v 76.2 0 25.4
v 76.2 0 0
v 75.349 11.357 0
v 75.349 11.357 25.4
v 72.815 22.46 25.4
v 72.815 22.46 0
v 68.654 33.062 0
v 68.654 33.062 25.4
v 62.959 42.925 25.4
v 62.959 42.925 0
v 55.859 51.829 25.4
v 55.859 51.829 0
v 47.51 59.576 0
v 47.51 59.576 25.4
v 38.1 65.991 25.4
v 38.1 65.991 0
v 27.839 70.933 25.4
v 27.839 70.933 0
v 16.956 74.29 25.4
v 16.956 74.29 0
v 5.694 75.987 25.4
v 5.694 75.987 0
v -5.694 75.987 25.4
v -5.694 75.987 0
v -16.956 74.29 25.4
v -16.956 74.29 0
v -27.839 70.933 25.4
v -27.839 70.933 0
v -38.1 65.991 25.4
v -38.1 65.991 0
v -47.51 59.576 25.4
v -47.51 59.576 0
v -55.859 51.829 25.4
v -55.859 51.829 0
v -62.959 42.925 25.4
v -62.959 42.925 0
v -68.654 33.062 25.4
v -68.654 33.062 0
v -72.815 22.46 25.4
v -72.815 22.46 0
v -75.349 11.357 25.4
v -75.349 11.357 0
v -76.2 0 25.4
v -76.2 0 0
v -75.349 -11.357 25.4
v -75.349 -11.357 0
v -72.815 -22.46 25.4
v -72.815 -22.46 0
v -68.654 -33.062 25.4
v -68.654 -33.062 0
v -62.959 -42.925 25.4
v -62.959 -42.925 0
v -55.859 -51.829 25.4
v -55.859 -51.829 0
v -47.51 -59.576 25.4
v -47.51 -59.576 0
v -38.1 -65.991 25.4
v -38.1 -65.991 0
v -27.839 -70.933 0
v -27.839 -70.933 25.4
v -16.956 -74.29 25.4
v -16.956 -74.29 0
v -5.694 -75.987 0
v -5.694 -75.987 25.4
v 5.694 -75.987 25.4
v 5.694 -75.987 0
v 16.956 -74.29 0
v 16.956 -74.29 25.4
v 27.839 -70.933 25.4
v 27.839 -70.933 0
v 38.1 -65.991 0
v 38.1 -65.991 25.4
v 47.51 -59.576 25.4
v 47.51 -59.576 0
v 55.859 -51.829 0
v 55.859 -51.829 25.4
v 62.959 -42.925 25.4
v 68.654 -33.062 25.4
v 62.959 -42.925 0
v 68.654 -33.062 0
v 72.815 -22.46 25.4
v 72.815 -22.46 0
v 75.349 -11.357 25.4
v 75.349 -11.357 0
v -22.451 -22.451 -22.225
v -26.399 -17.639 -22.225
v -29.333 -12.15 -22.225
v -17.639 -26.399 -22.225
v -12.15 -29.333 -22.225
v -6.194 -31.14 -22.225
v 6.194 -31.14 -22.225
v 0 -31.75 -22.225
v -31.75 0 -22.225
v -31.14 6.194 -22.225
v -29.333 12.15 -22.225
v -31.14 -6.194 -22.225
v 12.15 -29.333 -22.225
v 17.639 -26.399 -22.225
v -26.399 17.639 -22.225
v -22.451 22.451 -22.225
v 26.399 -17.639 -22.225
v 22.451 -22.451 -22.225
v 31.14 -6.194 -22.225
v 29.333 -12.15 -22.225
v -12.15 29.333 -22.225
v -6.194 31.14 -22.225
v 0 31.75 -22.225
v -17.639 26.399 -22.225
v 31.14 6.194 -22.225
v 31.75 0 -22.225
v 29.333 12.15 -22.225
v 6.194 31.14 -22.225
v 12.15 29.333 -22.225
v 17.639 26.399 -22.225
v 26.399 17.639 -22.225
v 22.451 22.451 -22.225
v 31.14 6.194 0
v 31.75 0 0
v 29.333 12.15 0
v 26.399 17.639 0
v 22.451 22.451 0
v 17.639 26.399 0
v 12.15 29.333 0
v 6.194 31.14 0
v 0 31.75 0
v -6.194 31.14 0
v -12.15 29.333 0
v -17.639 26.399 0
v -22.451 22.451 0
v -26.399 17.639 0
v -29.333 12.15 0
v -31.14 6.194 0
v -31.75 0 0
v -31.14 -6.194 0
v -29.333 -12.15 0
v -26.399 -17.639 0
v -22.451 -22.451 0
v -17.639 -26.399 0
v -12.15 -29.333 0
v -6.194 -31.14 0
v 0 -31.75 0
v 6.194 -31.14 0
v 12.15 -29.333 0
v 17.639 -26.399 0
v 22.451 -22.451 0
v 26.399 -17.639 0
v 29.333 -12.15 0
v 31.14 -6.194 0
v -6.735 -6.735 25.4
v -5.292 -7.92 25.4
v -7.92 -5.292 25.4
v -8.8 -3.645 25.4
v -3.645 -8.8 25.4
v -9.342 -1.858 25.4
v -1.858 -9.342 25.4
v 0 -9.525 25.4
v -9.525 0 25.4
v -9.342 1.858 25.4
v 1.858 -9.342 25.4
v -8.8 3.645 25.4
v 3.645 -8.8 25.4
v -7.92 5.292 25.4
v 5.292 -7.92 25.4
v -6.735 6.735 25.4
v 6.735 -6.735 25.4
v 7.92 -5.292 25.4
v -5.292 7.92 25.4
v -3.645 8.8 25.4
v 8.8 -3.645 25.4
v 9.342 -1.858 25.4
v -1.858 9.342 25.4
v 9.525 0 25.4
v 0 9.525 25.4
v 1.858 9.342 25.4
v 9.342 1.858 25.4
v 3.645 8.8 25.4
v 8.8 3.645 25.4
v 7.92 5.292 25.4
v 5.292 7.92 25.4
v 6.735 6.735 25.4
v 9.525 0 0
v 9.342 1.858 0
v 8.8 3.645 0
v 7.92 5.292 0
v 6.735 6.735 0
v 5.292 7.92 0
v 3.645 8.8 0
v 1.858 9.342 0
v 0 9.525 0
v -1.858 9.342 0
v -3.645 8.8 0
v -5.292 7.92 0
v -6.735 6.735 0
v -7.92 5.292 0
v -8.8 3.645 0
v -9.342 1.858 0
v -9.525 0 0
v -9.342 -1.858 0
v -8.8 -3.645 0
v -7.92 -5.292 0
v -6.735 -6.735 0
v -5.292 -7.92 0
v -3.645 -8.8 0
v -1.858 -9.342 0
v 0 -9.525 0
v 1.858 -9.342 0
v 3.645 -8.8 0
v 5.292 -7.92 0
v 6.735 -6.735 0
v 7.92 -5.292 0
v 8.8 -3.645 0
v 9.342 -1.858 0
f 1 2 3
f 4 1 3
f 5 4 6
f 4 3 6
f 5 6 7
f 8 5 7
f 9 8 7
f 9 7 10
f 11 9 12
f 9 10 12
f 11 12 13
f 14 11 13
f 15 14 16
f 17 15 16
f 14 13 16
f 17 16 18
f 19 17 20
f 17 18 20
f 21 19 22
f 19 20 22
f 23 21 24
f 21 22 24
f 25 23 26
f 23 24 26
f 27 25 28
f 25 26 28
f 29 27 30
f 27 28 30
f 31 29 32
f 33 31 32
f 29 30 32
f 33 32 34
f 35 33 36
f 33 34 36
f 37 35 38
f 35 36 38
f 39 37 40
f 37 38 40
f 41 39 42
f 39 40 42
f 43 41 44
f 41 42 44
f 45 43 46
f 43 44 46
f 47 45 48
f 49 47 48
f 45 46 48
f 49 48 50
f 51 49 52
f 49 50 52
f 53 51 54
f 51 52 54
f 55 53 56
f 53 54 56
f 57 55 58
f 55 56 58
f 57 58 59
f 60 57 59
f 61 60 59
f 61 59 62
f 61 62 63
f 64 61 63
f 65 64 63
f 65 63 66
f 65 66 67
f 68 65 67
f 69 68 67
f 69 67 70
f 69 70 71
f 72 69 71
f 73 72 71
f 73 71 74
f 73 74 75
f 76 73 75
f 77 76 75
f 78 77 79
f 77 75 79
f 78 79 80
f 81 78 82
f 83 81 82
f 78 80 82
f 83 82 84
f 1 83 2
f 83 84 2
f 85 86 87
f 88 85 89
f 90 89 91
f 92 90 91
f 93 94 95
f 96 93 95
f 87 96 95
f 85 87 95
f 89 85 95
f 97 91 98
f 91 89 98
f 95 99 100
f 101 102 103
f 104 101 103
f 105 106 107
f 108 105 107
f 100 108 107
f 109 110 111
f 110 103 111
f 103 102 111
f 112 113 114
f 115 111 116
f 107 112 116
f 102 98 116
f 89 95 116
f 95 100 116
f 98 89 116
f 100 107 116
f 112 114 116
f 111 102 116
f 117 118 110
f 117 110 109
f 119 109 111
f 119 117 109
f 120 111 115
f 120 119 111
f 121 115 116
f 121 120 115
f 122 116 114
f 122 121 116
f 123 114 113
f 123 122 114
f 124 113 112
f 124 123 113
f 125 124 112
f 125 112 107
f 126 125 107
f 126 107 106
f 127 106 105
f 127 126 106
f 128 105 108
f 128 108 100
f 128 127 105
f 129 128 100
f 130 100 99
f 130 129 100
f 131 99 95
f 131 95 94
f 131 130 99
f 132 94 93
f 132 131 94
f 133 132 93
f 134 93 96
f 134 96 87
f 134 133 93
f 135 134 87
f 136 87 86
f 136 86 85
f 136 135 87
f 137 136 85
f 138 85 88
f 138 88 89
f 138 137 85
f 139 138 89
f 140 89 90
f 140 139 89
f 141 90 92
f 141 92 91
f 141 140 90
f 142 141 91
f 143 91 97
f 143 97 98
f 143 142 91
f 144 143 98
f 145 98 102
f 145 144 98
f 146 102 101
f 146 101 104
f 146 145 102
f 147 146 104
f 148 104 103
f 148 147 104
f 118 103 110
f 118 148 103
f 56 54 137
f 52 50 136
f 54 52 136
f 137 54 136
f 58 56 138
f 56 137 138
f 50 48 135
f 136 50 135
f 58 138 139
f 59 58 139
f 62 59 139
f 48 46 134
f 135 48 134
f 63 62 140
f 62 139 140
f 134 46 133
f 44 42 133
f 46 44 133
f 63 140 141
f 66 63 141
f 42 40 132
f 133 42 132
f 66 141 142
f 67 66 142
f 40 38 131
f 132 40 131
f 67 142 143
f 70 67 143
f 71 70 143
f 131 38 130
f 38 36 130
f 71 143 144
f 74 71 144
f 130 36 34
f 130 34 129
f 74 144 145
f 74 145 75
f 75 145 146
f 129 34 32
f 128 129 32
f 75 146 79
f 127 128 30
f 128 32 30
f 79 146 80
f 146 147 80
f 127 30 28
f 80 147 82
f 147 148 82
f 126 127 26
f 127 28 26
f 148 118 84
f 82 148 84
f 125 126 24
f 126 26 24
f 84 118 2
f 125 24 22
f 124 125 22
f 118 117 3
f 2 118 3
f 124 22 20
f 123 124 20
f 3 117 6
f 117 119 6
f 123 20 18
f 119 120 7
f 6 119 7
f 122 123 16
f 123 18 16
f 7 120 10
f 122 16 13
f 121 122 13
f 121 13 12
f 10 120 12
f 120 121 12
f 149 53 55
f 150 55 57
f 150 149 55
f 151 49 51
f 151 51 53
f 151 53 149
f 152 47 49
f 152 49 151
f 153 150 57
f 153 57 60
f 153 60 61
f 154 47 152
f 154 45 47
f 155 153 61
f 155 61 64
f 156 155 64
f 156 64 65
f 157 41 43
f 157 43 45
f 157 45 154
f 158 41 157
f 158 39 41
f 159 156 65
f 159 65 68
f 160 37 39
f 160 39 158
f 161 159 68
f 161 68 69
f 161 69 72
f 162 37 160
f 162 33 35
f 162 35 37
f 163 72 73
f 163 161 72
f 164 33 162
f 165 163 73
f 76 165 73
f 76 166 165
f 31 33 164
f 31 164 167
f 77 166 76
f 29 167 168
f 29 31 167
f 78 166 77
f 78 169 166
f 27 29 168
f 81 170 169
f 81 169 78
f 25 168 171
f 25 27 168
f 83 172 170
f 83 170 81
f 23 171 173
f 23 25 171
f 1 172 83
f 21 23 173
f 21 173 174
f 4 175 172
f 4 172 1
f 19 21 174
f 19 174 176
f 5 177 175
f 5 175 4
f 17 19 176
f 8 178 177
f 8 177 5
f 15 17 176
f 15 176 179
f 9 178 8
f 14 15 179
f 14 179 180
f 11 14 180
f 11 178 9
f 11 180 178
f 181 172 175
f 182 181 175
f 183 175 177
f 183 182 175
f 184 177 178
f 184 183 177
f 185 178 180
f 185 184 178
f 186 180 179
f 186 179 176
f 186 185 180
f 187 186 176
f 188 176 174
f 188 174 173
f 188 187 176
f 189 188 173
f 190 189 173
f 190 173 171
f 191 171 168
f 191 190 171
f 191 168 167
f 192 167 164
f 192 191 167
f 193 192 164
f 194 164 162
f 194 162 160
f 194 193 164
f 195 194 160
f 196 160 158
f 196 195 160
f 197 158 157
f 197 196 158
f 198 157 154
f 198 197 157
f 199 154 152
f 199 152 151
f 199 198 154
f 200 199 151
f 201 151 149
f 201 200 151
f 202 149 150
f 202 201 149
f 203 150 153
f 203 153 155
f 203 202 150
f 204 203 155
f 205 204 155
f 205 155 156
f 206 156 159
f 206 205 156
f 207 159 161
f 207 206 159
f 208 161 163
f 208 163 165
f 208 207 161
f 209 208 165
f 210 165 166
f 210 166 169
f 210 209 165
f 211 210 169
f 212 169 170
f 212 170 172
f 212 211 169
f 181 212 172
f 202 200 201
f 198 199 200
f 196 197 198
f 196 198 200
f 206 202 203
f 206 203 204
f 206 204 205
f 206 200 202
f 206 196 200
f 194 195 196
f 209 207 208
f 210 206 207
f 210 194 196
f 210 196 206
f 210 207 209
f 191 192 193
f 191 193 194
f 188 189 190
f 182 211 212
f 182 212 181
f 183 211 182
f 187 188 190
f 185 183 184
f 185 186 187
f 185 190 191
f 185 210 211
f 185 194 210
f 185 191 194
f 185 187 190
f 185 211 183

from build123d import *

# Parameters (mm, degrees)
SKETCH1_R           = 76.2
SKETCH1_R_2         = 9.525
BOSS_EXTRUDE1_DEPTH = 25.4
SKETCH2_R           = 31.75
BOSS_EXTRUDE2_DEPTH = 22.225


with BuildPart() as part:
    # Sketch1 → Boss-Extrude1 (new body)
    with BuildSketch(Plane.XY):
        Circle(SKETCH1_R)
        Circle(SKETCH1_R_2, mode=Mode.SUBTRACT)
    extrude(amount=BOSS_EXTRUDE1_DEPTH)

    # Sketch2 → Boss-Extrude2 (add)
    with BuildSketch(Plane.XY):
        Circle(SKETCH2_R)
    extrude(amount=-BOSS_EXTRUDE2_DEPTH)


solid = part.part
